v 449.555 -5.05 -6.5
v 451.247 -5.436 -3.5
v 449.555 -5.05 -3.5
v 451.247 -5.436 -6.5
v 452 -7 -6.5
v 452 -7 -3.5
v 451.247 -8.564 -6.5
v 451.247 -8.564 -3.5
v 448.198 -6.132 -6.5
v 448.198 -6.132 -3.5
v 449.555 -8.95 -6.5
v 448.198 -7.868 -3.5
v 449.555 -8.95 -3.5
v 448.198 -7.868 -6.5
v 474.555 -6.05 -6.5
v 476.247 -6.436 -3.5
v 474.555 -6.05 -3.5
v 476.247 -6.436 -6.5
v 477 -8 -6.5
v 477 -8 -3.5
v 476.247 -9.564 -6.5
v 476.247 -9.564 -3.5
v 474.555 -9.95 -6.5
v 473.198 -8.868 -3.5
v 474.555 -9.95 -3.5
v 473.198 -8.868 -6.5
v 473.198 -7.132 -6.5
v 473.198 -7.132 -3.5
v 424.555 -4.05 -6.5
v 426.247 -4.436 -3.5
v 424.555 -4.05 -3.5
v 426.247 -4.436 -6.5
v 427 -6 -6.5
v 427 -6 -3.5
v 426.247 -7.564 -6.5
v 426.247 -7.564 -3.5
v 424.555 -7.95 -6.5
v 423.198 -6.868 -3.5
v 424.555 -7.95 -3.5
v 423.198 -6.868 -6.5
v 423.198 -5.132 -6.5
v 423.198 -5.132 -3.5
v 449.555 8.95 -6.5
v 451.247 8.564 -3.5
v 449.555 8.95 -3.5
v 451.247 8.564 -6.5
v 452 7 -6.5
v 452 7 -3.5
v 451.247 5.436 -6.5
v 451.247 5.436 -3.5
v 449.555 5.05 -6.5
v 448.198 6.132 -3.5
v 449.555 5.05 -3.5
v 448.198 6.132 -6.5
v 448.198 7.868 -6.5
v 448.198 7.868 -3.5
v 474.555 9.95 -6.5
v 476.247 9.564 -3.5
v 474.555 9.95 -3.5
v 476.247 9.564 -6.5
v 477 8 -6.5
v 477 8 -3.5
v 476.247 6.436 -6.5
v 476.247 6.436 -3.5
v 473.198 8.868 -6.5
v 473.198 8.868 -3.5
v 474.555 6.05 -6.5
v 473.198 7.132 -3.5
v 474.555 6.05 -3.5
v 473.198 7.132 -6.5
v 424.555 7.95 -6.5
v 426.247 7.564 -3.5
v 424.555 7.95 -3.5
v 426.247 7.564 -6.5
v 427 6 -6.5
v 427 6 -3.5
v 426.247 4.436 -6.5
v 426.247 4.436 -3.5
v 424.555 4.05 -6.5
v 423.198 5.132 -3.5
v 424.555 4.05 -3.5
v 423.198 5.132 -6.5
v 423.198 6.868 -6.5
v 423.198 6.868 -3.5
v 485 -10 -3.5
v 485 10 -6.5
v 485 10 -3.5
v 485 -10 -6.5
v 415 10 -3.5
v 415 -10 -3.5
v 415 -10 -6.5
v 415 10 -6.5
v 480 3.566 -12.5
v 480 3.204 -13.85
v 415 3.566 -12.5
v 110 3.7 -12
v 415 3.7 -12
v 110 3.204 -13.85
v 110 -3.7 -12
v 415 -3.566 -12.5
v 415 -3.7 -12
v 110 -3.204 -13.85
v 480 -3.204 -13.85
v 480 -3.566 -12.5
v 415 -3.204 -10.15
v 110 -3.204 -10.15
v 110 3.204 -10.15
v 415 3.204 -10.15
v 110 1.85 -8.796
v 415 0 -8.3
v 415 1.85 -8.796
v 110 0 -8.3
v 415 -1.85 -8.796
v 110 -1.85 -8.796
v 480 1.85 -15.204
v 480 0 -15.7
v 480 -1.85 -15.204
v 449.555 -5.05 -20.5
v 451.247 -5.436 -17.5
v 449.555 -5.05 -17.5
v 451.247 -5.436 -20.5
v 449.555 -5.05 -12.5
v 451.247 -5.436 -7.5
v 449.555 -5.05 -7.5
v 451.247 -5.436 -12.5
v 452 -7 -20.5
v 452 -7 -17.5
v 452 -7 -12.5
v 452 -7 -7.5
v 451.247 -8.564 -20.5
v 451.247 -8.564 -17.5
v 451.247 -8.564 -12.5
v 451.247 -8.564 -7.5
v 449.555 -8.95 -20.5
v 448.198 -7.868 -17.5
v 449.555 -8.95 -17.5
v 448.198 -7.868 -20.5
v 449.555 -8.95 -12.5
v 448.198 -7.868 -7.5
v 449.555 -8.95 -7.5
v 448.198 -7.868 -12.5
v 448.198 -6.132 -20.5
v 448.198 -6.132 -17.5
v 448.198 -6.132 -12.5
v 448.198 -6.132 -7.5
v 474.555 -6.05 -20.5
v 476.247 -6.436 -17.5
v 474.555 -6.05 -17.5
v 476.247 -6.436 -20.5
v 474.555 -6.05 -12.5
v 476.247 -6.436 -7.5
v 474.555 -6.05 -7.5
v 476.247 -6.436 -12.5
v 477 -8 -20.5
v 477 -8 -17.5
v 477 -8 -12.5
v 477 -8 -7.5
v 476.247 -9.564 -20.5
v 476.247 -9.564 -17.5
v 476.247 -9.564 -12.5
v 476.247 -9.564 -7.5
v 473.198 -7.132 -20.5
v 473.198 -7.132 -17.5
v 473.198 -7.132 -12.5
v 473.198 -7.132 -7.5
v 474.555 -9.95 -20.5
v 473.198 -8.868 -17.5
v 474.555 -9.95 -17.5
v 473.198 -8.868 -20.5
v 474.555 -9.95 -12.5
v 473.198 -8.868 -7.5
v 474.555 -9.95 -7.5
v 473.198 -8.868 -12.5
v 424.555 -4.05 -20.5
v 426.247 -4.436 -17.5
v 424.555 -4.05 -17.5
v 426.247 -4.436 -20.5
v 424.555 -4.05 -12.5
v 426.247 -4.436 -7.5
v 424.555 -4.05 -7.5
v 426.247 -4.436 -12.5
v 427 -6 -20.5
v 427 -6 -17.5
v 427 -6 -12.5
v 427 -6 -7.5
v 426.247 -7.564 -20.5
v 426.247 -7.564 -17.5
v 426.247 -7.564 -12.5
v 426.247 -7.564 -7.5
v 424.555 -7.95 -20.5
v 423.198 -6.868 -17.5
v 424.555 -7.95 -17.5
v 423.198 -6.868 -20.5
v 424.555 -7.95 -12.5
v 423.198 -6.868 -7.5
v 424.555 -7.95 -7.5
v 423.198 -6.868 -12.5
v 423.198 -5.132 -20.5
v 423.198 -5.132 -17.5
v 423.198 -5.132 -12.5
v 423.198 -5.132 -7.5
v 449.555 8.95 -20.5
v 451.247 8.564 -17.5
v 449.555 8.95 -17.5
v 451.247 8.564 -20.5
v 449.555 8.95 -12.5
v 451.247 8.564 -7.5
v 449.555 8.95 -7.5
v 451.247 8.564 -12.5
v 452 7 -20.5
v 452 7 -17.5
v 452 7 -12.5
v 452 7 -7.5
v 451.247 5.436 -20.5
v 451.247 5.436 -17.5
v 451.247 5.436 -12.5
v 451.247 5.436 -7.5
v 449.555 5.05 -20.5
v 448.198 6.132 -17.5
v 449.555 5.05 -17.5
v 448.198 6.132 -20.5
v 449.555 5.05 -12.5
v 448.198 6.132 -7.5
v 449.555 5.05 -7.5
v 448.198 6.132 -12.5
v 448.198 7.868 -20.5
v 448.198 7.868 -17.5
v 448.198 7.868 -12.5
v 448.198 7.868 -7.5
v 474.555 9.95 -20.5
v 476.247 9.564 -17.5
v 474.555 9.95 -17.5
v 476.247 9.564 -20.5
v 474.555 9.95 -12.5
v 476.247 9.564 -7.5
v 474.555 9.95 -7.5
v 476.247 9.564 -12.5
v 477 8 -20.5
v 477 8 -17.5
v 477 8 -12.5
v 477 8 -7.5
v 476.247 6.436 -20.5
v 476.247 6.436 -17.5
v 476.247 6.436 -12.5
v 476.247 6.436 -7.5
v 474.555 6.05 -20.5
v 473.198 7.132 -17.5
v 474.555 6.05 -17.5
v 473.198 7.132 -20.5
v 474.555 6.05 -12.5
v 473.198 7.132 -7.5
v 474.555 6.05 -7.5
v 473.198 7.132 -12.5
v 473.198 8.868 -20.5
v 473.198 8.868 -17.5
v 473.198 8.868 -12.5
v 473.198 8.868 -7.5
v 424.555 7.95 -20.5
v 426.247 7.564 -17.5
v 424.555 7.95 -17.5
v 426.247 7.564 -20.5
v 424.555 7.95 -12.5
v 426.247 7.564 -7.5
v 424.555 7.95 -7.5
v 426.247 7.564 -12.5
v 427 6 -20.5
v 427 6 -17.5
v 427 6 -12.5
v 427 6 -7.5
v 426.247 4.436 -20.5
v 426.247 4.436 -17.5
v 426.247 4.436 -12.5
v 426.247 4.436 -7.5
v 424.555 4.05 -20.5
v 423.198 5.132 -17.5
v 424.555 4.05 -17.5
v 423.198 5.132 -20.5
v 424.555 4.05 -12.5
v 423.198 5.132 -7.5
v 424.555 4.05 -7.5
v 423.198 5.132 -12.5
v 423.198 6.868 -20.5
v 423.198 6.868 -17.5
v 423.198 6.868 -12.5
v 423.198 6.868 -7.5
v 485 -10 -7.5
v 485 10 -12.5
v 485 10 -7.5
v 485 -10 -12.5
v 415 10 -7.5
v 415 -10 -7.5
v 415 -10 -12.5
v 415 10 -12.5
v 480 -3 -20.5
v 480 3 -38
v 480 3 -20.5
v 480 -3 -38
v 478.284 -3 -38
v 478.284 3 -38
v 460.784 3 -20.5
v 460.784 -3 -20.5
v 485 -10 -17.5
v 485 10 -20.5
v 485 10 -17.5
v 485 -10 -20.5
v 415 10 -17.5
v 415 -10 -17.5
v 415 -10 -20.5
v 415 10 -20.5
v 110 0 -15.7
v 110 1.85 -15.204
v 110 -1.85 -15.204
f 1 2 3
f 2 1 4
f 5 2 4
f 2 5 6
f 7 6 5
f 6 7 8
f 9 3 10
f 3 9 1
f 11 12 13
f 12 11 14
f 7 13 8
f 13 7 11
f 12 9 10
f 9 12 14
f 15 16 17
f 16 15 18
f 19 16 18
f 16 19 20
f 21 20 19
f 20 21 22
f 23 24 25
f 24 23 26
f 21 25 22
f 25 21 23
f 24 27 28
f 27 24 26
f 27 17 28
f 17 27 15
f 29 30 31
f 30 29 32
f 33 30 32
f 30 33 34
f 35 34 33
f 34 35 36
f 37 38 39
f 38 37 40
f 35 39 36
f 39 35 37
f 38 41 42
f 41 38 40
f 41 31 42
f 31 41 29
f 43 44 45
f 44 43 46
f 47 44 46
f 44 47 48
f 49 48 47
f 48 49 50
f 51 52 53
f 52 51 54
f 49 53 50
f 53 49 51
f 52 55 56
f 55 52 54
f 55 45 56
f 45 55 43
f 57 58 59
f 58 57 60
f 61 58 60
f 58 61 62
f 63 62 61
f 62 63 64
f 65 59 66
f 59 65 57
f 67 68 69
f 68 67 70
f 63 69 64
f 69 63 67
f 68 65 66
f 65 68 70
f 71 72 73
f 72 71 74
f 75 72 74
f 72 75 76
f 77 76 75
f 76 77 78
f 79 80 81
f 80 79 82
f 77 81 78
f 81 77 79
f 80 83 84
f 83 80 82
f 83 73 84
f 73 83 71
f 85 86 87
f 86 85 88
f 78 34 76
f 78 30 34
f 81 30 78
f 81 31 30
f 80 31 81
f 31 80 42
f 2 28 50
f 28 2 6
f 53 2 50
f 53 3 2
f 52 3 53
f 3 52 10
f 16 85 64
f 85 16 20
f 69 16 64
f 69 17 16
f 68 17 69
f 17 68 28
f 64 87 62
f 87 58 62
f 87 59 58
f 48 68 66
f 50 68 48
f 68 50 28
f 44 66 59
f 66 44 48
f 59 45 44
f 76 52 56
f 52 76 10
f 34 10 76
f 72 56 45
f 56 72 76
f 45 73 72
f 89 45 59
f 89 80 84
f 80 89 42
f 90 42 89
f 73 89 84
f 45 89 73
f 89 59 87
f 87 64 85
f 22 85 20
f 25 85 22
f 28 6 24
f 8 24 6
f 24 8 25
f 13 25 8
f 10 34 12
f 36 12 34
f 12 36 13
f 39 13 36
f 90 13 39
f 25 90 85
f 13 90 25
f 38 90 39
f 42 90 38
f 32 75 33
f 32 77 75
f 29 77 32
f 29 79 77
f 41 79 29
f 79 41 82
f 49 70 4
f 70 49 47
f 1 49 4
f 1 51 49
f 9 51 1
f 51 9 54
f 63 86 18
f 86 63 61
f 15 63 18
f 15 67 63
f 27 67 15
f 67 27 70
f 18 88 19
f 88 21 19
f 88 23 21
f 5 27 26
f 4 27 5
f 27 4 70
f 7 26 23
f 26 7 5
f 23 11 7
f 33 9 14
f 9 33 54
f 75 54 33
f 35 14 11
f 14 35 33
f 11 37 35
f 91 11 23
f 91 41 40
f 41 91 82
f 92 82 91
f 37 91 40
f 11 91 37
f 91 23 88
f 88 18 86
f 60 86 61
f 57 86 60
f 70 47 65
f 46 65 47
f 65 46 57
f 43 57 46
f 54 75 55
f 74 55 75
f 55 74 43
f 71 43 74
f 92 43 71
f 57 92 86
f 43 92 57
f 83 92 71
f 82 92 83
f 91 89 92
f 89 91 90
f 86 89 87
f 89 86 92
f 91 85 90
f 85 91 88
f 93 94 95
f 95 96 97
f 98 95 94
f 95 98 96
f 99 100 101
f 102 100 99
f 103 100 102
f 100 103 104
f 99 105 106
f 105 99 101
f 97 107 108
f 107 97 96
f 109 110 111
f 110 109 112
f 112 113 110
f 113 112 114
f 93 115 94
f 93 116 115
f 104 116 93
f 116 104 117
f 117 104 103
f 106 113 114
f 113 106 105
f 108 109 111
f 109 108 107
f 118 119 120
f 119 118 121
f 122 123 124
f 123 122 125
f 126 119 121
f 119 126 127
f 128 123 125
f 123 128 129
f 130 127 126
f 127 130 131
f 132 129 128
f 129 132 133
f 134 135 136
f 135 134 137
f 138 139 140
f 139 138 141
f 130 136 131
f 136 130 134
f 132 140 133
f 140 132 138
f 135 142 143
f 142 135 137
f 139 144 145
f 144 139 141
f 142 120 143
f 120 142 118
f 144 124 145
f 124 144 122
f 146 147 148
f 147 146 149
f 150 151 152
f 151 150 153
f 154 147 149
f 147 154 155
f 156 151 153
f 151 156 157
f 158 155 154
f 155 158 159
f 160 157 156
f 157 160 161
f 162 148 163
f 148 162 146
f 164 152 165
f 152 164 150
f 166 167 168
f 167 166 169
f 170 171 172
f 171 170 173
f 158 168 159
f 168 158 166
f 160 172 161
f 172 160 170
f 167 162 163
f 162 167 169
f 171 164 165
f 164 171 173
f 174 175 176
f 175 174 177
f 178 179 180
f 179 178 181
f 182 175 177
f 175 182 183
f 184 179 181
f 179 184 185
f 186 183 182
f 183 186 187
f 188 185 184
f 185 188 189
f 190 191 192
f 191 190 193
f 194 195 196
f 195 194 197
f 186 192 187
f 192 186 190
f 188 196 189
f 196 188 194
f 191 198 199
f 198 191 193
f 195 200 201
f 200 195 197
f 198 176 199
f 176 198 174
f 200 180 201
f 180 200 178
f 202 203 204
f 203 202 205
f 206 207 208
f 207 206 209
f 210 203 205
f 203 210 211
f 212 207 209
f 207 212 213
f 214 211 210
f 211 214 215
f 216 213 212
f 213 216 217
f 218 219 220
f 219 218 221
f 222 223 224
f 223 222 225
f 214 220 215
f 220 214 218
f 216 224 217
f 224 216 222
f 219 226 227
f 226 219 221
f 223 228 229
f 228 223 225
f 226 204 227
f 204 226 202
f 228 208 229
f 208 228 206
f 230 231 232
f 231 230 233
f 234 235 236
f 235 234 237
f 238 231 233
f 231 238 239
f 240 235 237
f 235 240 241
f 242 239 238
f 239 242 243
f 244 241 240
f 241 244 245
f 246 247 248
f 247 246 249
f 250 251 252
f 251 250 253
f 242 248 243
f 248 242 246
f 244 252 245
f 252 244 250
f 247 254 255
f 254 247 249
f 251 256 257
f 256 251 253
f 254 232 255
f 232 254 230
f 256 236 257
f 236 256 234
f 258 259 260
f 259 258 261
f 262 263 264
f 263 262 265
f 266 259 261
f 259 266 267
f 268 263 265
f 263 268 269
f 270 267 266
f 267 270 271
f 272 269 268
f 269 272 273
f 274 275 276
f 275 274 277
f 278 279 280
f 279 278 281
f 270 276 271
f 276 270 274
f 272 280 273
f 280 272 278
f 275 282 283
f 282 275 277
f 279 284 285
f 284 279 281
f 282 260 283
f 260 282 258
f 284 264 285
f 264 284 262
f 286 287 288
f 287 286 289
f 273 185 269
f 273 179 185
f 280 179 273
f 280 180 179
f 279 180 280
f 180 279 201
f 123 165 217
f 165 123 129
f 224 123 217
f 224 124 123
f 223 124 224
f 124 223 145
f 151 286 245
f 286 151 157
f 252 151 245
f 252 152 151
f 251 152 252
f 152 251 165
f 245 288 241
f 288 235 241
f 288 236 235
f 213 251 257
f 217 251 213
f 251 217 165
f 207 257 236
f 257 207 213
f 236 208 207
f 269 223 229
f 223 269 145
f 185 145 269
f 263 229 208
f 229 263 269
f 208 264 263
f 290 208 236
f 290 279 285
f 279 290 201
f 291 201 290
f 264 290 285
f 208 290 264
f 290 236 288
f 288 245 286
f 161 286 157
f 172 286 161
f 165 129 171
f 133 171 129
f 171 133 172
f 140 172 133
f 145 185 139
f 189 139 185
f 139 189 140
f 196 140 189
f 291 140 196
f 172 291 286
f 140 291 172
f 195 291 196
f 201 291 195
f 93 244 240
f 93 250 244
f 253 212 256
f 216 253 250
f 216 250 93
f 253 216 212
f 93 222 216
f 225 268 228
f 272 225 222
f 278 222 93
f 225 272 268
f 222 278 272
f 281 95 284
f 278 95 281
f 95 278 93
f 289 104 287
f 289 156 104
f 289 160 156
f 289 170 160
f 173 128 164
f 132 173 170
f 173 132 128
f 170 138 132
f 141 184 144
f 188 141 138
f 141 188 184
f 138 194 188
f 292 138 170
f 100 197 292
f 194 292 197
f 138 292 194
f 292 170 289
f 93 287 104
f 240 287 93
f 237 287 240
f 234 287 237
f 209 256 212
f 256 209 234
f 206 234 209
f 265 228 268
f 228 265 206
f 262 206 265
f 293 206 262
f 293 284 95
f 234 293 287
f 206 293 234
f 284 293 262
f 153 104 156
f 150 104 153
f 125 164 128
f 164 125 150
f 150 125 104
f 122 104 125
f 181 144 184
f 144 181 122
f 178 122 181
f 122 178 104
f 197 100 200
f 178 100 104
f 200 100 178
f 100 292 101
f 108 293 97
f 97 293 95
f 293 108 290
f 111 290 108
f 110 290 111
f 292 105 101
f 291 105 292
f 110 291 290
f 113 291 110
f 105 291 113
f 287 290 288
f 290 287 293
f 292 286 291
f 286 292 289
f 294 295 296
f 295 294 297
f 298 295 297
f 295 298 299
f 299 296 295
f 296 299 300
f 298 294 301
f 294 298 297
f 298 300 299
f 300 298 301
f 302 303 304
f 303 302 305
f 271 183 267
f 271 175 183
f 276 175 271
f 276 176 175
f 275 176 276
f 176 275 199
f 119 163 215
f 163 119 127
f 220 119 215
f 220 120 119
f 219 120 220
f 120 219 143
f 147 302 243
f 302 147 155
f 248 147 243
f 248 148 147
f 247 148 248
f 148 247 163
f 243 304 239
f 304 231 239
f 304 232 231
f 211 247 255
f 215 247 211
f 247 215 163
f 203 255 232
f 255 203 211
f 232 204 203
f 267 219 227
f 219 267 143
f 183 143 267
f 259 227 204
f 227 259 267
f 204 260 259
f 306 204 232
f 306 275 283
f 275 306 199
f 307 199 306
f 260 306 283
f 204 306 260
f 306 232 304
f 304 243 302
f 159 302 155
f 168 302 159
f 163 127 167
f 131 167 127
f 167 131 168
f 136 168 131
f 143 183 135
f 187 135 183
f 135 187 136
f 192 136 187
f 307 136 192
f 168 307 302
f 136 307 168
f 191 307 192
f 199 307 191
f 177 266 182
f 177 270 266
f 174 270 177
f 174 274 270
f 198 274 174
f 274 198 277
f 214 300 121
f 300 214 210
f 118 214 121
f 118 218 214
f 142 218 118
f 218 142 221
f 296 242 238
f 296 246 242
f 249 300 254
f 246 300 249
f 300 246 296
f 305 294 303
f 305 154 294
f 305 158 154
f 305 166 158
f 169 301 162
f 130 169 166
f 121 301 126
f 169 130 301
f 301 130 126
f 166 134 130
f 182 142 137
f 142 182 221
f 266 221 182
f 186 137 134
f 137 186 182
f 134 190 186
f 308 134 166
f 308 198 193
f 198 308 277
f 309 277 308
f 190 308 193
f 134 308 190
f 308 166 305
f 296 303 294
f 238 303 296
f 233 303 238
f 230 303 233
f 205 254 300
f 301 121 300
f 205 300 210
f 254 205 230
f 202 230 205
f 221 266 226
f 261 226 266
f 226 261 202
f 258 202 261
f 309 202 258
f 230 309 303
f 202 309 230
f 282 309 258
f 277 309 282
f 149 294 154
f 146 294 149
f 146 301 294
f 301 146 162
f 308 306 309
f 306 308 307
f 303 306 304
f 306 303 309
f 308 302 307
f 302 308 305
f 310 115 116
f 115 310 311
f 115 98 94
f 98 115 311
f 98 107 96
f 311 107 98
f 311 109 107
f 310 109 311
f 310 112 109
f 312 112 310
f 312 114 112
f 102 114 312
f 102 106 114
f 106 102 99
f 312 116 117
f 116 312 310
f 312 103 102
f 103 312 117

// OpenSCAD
module tail_up_front(){
  translate([0,0,2]){
    difference(){
      union(){
        scale(0.8) translate([500,-65.2,-13]){
          difference(){
            translate([0,-22,0]) scale([0.6,0.4,0.6])
              linear_extrude(file = "tail/front.dxf",height = 200, convexity = 10);
            union(){
              translate([110,60-5,-1])
              cube([36,70+5,20+15]);
              translate([110,60-5,101])
              cube([36,70+5,20]);
              translate([110,60-5,30+15])
              cube([16,70+5,60-15]);
            }
          }
        }
      }
      translate([400,-100,-7.5-300])cube(300);
    }
    translate([0,0,3])tail_upper_socket();
  }
}

module tail_front(){
difference(){
  union(){
    scale(0.8) translate([500,-65.2,-13]){
      difference(){
        translate([0,-22,0]) scale([0.6,0.4,0.6])
          linear_extrude(file = "tail/front.dxf",height = 200, convexity = 10);
        union(){
          translate([110,60-5,-1])
          cube([36,70+5,20+15]);
          translate([110,60-5,101])
          cube([36,70+5,20]);
          translate([110,60-5,30+15])
          cube([16,70+5,60-15]);
        }
      }
    }
  }
  translate([400,-100,-7.501])cube(300);
}

}

module tail_back(){
  scale(0.8) translate([500,-65.2,-13]) {
  difference(){
  scale([0.6,0.3,0.6])
  scale([0.6,1,1])
  translate([120,0,0])
  linear_extrude(file = "tail/back.dxf",height = 200, convexity = 10);
  union(){
    translate([110,60,18+15])
    cube([22,70,120-36-15]);
    translate([110,0,0]) rotate([0,45+14,0]) cube([100,297,300]);
    translate([110,0,-1-5+3]) cube([60,297,11]);
  }
  }
  }

}

module tail_rod(){
      translate([110, 0, -12])rotate([0,90,0])cylinder(r=3.7,h=370);
}

module tail_unstranlated(){
difference(){
union(){
  tail_front();
  tail_back();
}
    translate([120,65,-1])
cylinder(r=2,h=200);

}
}

module tail(){
  difference(){
    tail_unstranlated();
    tail_rod();
  }
}

module tail_socket(){
  difference(){
    translate([450,0,-10]) cube([70,20,5],center=true);
    union(){
      tail_rod();
      translate([450,-7,-100]) cylinder(r=2,h=400);
      translate([475,-8,-100]) cylinder(r=2,h=400);
      translate([425,-6,-100]) cylinder(r=2,h=400);
      translate([450,7,-100]) cylinder(r=2,h=400);
      translate([475,8,-100]) cylinder(r=2,h=400);
      translate([425,6,-100]) cylinder(r=2,h=400);
    }
  }
}

module tail_upper_socket(){
  difference(){
    translate([450,0,-10]) cube([70,20,3],center=true);
    union(){
      translate([450,-7,-100]) cylinder(r=2,h=400);
     translate([475,-8,-100]) cylinder(r=2,h=400);
     translate([425,-6,-100]) cylinder(r=2,h=400);
     translate([450,7,-100]) cylinder(r=2,h=400);
     translate([475,8,-100]) cylinder(r=2,h=400);
     translate([425,6,-100]) cylinder(r=2,h=400);
    }
  }
}

module tail_socket_bottom(){
  back_wheel();
  difference(){
    translate([450,0,-19]) cube([70,20,3],center=true);
    union(){
      tail_rod();
      translate([450,-7,-100]) cylinder(r=2,h=400);
     translate([475,-8,-100]) cylinder(r=2,h=400);
     translate([425,-6,-100]) cylinder(r=2,h=400);
     translate([450,7,-100]) cylinder(r=2,h=400);
     translate([475,8,-100]) cylinder(r=2,h=400);
     translate([425,6,-100]) cylinder(r=2,h=400);
    }
  }
}

module back_wheel(){
difference(){
 translate([470,0,-28]) cube([20,6,20],center=true);
 translate([470-10,-6+12,-28-20]) rotate([0,45,0]) cube([40,40,40],center=true);
}
}

module elevator_fixed(){
difference(){
  union(){
    translate([500*0.8,48/0.7,-66]) rotate([90,0,0])
    scale([0.48,0.24,0.7]) linear_extrude(file = "tail/front.dxf",height = 200, convexity = 10);
  }
  union(){
    tail_rod();
      translate([450,-7,-100]) cylinder(r=2,h=400);
     translate([475,-8,-100]) cylinder(r=2,h=400);
     translate([425,-6,-100]) cylinder(r=2,h=400);
     translate([450,7,-100]) cylinder(r=2,h=400);
     translate([475,8,-100]) cylinder(r=2,h=400);
     translate([425,6,-100]) cylinder(r=2,h=400);
    translate([150,-200,-17-5/2]) cube([1000,1000,5]);
    translate([490,-60,-100]) cube([50,117,300]);
    translate([497,200,-12.5]) rotate([90,0,0]) cylinder(r=1,h=400);
  }
}
}

module elevator(){
  difference(){
    difference(){
      translate([500*0.8-3+35,48/0.7,-66]) rotate([90,0,0]) scale([0.3,0.24,0.7])
      linear_extrude(file = "tail/back.dxf",height = 200, convexity = 10);
      union(){
        translate([150,-200,-17-5/2]) cube([1000,1000,5]);
        translate([490,-90,-100]) cube([16,31,300]);
        translate([490,-60+117+1-2,-100]) cube([16,297,300]);
      }
  }
    translate([497,200,-12.5]) rotate([90,0,0]) cylinder(r=1,h=400);
  }
  
}

module tail_full(){
  tail();
  tail_up_front();
  tail_rod();
  tail_socket();
  tail_socket_bottom();
  elevator_fixed();
  elevator();
}


tail_full();
